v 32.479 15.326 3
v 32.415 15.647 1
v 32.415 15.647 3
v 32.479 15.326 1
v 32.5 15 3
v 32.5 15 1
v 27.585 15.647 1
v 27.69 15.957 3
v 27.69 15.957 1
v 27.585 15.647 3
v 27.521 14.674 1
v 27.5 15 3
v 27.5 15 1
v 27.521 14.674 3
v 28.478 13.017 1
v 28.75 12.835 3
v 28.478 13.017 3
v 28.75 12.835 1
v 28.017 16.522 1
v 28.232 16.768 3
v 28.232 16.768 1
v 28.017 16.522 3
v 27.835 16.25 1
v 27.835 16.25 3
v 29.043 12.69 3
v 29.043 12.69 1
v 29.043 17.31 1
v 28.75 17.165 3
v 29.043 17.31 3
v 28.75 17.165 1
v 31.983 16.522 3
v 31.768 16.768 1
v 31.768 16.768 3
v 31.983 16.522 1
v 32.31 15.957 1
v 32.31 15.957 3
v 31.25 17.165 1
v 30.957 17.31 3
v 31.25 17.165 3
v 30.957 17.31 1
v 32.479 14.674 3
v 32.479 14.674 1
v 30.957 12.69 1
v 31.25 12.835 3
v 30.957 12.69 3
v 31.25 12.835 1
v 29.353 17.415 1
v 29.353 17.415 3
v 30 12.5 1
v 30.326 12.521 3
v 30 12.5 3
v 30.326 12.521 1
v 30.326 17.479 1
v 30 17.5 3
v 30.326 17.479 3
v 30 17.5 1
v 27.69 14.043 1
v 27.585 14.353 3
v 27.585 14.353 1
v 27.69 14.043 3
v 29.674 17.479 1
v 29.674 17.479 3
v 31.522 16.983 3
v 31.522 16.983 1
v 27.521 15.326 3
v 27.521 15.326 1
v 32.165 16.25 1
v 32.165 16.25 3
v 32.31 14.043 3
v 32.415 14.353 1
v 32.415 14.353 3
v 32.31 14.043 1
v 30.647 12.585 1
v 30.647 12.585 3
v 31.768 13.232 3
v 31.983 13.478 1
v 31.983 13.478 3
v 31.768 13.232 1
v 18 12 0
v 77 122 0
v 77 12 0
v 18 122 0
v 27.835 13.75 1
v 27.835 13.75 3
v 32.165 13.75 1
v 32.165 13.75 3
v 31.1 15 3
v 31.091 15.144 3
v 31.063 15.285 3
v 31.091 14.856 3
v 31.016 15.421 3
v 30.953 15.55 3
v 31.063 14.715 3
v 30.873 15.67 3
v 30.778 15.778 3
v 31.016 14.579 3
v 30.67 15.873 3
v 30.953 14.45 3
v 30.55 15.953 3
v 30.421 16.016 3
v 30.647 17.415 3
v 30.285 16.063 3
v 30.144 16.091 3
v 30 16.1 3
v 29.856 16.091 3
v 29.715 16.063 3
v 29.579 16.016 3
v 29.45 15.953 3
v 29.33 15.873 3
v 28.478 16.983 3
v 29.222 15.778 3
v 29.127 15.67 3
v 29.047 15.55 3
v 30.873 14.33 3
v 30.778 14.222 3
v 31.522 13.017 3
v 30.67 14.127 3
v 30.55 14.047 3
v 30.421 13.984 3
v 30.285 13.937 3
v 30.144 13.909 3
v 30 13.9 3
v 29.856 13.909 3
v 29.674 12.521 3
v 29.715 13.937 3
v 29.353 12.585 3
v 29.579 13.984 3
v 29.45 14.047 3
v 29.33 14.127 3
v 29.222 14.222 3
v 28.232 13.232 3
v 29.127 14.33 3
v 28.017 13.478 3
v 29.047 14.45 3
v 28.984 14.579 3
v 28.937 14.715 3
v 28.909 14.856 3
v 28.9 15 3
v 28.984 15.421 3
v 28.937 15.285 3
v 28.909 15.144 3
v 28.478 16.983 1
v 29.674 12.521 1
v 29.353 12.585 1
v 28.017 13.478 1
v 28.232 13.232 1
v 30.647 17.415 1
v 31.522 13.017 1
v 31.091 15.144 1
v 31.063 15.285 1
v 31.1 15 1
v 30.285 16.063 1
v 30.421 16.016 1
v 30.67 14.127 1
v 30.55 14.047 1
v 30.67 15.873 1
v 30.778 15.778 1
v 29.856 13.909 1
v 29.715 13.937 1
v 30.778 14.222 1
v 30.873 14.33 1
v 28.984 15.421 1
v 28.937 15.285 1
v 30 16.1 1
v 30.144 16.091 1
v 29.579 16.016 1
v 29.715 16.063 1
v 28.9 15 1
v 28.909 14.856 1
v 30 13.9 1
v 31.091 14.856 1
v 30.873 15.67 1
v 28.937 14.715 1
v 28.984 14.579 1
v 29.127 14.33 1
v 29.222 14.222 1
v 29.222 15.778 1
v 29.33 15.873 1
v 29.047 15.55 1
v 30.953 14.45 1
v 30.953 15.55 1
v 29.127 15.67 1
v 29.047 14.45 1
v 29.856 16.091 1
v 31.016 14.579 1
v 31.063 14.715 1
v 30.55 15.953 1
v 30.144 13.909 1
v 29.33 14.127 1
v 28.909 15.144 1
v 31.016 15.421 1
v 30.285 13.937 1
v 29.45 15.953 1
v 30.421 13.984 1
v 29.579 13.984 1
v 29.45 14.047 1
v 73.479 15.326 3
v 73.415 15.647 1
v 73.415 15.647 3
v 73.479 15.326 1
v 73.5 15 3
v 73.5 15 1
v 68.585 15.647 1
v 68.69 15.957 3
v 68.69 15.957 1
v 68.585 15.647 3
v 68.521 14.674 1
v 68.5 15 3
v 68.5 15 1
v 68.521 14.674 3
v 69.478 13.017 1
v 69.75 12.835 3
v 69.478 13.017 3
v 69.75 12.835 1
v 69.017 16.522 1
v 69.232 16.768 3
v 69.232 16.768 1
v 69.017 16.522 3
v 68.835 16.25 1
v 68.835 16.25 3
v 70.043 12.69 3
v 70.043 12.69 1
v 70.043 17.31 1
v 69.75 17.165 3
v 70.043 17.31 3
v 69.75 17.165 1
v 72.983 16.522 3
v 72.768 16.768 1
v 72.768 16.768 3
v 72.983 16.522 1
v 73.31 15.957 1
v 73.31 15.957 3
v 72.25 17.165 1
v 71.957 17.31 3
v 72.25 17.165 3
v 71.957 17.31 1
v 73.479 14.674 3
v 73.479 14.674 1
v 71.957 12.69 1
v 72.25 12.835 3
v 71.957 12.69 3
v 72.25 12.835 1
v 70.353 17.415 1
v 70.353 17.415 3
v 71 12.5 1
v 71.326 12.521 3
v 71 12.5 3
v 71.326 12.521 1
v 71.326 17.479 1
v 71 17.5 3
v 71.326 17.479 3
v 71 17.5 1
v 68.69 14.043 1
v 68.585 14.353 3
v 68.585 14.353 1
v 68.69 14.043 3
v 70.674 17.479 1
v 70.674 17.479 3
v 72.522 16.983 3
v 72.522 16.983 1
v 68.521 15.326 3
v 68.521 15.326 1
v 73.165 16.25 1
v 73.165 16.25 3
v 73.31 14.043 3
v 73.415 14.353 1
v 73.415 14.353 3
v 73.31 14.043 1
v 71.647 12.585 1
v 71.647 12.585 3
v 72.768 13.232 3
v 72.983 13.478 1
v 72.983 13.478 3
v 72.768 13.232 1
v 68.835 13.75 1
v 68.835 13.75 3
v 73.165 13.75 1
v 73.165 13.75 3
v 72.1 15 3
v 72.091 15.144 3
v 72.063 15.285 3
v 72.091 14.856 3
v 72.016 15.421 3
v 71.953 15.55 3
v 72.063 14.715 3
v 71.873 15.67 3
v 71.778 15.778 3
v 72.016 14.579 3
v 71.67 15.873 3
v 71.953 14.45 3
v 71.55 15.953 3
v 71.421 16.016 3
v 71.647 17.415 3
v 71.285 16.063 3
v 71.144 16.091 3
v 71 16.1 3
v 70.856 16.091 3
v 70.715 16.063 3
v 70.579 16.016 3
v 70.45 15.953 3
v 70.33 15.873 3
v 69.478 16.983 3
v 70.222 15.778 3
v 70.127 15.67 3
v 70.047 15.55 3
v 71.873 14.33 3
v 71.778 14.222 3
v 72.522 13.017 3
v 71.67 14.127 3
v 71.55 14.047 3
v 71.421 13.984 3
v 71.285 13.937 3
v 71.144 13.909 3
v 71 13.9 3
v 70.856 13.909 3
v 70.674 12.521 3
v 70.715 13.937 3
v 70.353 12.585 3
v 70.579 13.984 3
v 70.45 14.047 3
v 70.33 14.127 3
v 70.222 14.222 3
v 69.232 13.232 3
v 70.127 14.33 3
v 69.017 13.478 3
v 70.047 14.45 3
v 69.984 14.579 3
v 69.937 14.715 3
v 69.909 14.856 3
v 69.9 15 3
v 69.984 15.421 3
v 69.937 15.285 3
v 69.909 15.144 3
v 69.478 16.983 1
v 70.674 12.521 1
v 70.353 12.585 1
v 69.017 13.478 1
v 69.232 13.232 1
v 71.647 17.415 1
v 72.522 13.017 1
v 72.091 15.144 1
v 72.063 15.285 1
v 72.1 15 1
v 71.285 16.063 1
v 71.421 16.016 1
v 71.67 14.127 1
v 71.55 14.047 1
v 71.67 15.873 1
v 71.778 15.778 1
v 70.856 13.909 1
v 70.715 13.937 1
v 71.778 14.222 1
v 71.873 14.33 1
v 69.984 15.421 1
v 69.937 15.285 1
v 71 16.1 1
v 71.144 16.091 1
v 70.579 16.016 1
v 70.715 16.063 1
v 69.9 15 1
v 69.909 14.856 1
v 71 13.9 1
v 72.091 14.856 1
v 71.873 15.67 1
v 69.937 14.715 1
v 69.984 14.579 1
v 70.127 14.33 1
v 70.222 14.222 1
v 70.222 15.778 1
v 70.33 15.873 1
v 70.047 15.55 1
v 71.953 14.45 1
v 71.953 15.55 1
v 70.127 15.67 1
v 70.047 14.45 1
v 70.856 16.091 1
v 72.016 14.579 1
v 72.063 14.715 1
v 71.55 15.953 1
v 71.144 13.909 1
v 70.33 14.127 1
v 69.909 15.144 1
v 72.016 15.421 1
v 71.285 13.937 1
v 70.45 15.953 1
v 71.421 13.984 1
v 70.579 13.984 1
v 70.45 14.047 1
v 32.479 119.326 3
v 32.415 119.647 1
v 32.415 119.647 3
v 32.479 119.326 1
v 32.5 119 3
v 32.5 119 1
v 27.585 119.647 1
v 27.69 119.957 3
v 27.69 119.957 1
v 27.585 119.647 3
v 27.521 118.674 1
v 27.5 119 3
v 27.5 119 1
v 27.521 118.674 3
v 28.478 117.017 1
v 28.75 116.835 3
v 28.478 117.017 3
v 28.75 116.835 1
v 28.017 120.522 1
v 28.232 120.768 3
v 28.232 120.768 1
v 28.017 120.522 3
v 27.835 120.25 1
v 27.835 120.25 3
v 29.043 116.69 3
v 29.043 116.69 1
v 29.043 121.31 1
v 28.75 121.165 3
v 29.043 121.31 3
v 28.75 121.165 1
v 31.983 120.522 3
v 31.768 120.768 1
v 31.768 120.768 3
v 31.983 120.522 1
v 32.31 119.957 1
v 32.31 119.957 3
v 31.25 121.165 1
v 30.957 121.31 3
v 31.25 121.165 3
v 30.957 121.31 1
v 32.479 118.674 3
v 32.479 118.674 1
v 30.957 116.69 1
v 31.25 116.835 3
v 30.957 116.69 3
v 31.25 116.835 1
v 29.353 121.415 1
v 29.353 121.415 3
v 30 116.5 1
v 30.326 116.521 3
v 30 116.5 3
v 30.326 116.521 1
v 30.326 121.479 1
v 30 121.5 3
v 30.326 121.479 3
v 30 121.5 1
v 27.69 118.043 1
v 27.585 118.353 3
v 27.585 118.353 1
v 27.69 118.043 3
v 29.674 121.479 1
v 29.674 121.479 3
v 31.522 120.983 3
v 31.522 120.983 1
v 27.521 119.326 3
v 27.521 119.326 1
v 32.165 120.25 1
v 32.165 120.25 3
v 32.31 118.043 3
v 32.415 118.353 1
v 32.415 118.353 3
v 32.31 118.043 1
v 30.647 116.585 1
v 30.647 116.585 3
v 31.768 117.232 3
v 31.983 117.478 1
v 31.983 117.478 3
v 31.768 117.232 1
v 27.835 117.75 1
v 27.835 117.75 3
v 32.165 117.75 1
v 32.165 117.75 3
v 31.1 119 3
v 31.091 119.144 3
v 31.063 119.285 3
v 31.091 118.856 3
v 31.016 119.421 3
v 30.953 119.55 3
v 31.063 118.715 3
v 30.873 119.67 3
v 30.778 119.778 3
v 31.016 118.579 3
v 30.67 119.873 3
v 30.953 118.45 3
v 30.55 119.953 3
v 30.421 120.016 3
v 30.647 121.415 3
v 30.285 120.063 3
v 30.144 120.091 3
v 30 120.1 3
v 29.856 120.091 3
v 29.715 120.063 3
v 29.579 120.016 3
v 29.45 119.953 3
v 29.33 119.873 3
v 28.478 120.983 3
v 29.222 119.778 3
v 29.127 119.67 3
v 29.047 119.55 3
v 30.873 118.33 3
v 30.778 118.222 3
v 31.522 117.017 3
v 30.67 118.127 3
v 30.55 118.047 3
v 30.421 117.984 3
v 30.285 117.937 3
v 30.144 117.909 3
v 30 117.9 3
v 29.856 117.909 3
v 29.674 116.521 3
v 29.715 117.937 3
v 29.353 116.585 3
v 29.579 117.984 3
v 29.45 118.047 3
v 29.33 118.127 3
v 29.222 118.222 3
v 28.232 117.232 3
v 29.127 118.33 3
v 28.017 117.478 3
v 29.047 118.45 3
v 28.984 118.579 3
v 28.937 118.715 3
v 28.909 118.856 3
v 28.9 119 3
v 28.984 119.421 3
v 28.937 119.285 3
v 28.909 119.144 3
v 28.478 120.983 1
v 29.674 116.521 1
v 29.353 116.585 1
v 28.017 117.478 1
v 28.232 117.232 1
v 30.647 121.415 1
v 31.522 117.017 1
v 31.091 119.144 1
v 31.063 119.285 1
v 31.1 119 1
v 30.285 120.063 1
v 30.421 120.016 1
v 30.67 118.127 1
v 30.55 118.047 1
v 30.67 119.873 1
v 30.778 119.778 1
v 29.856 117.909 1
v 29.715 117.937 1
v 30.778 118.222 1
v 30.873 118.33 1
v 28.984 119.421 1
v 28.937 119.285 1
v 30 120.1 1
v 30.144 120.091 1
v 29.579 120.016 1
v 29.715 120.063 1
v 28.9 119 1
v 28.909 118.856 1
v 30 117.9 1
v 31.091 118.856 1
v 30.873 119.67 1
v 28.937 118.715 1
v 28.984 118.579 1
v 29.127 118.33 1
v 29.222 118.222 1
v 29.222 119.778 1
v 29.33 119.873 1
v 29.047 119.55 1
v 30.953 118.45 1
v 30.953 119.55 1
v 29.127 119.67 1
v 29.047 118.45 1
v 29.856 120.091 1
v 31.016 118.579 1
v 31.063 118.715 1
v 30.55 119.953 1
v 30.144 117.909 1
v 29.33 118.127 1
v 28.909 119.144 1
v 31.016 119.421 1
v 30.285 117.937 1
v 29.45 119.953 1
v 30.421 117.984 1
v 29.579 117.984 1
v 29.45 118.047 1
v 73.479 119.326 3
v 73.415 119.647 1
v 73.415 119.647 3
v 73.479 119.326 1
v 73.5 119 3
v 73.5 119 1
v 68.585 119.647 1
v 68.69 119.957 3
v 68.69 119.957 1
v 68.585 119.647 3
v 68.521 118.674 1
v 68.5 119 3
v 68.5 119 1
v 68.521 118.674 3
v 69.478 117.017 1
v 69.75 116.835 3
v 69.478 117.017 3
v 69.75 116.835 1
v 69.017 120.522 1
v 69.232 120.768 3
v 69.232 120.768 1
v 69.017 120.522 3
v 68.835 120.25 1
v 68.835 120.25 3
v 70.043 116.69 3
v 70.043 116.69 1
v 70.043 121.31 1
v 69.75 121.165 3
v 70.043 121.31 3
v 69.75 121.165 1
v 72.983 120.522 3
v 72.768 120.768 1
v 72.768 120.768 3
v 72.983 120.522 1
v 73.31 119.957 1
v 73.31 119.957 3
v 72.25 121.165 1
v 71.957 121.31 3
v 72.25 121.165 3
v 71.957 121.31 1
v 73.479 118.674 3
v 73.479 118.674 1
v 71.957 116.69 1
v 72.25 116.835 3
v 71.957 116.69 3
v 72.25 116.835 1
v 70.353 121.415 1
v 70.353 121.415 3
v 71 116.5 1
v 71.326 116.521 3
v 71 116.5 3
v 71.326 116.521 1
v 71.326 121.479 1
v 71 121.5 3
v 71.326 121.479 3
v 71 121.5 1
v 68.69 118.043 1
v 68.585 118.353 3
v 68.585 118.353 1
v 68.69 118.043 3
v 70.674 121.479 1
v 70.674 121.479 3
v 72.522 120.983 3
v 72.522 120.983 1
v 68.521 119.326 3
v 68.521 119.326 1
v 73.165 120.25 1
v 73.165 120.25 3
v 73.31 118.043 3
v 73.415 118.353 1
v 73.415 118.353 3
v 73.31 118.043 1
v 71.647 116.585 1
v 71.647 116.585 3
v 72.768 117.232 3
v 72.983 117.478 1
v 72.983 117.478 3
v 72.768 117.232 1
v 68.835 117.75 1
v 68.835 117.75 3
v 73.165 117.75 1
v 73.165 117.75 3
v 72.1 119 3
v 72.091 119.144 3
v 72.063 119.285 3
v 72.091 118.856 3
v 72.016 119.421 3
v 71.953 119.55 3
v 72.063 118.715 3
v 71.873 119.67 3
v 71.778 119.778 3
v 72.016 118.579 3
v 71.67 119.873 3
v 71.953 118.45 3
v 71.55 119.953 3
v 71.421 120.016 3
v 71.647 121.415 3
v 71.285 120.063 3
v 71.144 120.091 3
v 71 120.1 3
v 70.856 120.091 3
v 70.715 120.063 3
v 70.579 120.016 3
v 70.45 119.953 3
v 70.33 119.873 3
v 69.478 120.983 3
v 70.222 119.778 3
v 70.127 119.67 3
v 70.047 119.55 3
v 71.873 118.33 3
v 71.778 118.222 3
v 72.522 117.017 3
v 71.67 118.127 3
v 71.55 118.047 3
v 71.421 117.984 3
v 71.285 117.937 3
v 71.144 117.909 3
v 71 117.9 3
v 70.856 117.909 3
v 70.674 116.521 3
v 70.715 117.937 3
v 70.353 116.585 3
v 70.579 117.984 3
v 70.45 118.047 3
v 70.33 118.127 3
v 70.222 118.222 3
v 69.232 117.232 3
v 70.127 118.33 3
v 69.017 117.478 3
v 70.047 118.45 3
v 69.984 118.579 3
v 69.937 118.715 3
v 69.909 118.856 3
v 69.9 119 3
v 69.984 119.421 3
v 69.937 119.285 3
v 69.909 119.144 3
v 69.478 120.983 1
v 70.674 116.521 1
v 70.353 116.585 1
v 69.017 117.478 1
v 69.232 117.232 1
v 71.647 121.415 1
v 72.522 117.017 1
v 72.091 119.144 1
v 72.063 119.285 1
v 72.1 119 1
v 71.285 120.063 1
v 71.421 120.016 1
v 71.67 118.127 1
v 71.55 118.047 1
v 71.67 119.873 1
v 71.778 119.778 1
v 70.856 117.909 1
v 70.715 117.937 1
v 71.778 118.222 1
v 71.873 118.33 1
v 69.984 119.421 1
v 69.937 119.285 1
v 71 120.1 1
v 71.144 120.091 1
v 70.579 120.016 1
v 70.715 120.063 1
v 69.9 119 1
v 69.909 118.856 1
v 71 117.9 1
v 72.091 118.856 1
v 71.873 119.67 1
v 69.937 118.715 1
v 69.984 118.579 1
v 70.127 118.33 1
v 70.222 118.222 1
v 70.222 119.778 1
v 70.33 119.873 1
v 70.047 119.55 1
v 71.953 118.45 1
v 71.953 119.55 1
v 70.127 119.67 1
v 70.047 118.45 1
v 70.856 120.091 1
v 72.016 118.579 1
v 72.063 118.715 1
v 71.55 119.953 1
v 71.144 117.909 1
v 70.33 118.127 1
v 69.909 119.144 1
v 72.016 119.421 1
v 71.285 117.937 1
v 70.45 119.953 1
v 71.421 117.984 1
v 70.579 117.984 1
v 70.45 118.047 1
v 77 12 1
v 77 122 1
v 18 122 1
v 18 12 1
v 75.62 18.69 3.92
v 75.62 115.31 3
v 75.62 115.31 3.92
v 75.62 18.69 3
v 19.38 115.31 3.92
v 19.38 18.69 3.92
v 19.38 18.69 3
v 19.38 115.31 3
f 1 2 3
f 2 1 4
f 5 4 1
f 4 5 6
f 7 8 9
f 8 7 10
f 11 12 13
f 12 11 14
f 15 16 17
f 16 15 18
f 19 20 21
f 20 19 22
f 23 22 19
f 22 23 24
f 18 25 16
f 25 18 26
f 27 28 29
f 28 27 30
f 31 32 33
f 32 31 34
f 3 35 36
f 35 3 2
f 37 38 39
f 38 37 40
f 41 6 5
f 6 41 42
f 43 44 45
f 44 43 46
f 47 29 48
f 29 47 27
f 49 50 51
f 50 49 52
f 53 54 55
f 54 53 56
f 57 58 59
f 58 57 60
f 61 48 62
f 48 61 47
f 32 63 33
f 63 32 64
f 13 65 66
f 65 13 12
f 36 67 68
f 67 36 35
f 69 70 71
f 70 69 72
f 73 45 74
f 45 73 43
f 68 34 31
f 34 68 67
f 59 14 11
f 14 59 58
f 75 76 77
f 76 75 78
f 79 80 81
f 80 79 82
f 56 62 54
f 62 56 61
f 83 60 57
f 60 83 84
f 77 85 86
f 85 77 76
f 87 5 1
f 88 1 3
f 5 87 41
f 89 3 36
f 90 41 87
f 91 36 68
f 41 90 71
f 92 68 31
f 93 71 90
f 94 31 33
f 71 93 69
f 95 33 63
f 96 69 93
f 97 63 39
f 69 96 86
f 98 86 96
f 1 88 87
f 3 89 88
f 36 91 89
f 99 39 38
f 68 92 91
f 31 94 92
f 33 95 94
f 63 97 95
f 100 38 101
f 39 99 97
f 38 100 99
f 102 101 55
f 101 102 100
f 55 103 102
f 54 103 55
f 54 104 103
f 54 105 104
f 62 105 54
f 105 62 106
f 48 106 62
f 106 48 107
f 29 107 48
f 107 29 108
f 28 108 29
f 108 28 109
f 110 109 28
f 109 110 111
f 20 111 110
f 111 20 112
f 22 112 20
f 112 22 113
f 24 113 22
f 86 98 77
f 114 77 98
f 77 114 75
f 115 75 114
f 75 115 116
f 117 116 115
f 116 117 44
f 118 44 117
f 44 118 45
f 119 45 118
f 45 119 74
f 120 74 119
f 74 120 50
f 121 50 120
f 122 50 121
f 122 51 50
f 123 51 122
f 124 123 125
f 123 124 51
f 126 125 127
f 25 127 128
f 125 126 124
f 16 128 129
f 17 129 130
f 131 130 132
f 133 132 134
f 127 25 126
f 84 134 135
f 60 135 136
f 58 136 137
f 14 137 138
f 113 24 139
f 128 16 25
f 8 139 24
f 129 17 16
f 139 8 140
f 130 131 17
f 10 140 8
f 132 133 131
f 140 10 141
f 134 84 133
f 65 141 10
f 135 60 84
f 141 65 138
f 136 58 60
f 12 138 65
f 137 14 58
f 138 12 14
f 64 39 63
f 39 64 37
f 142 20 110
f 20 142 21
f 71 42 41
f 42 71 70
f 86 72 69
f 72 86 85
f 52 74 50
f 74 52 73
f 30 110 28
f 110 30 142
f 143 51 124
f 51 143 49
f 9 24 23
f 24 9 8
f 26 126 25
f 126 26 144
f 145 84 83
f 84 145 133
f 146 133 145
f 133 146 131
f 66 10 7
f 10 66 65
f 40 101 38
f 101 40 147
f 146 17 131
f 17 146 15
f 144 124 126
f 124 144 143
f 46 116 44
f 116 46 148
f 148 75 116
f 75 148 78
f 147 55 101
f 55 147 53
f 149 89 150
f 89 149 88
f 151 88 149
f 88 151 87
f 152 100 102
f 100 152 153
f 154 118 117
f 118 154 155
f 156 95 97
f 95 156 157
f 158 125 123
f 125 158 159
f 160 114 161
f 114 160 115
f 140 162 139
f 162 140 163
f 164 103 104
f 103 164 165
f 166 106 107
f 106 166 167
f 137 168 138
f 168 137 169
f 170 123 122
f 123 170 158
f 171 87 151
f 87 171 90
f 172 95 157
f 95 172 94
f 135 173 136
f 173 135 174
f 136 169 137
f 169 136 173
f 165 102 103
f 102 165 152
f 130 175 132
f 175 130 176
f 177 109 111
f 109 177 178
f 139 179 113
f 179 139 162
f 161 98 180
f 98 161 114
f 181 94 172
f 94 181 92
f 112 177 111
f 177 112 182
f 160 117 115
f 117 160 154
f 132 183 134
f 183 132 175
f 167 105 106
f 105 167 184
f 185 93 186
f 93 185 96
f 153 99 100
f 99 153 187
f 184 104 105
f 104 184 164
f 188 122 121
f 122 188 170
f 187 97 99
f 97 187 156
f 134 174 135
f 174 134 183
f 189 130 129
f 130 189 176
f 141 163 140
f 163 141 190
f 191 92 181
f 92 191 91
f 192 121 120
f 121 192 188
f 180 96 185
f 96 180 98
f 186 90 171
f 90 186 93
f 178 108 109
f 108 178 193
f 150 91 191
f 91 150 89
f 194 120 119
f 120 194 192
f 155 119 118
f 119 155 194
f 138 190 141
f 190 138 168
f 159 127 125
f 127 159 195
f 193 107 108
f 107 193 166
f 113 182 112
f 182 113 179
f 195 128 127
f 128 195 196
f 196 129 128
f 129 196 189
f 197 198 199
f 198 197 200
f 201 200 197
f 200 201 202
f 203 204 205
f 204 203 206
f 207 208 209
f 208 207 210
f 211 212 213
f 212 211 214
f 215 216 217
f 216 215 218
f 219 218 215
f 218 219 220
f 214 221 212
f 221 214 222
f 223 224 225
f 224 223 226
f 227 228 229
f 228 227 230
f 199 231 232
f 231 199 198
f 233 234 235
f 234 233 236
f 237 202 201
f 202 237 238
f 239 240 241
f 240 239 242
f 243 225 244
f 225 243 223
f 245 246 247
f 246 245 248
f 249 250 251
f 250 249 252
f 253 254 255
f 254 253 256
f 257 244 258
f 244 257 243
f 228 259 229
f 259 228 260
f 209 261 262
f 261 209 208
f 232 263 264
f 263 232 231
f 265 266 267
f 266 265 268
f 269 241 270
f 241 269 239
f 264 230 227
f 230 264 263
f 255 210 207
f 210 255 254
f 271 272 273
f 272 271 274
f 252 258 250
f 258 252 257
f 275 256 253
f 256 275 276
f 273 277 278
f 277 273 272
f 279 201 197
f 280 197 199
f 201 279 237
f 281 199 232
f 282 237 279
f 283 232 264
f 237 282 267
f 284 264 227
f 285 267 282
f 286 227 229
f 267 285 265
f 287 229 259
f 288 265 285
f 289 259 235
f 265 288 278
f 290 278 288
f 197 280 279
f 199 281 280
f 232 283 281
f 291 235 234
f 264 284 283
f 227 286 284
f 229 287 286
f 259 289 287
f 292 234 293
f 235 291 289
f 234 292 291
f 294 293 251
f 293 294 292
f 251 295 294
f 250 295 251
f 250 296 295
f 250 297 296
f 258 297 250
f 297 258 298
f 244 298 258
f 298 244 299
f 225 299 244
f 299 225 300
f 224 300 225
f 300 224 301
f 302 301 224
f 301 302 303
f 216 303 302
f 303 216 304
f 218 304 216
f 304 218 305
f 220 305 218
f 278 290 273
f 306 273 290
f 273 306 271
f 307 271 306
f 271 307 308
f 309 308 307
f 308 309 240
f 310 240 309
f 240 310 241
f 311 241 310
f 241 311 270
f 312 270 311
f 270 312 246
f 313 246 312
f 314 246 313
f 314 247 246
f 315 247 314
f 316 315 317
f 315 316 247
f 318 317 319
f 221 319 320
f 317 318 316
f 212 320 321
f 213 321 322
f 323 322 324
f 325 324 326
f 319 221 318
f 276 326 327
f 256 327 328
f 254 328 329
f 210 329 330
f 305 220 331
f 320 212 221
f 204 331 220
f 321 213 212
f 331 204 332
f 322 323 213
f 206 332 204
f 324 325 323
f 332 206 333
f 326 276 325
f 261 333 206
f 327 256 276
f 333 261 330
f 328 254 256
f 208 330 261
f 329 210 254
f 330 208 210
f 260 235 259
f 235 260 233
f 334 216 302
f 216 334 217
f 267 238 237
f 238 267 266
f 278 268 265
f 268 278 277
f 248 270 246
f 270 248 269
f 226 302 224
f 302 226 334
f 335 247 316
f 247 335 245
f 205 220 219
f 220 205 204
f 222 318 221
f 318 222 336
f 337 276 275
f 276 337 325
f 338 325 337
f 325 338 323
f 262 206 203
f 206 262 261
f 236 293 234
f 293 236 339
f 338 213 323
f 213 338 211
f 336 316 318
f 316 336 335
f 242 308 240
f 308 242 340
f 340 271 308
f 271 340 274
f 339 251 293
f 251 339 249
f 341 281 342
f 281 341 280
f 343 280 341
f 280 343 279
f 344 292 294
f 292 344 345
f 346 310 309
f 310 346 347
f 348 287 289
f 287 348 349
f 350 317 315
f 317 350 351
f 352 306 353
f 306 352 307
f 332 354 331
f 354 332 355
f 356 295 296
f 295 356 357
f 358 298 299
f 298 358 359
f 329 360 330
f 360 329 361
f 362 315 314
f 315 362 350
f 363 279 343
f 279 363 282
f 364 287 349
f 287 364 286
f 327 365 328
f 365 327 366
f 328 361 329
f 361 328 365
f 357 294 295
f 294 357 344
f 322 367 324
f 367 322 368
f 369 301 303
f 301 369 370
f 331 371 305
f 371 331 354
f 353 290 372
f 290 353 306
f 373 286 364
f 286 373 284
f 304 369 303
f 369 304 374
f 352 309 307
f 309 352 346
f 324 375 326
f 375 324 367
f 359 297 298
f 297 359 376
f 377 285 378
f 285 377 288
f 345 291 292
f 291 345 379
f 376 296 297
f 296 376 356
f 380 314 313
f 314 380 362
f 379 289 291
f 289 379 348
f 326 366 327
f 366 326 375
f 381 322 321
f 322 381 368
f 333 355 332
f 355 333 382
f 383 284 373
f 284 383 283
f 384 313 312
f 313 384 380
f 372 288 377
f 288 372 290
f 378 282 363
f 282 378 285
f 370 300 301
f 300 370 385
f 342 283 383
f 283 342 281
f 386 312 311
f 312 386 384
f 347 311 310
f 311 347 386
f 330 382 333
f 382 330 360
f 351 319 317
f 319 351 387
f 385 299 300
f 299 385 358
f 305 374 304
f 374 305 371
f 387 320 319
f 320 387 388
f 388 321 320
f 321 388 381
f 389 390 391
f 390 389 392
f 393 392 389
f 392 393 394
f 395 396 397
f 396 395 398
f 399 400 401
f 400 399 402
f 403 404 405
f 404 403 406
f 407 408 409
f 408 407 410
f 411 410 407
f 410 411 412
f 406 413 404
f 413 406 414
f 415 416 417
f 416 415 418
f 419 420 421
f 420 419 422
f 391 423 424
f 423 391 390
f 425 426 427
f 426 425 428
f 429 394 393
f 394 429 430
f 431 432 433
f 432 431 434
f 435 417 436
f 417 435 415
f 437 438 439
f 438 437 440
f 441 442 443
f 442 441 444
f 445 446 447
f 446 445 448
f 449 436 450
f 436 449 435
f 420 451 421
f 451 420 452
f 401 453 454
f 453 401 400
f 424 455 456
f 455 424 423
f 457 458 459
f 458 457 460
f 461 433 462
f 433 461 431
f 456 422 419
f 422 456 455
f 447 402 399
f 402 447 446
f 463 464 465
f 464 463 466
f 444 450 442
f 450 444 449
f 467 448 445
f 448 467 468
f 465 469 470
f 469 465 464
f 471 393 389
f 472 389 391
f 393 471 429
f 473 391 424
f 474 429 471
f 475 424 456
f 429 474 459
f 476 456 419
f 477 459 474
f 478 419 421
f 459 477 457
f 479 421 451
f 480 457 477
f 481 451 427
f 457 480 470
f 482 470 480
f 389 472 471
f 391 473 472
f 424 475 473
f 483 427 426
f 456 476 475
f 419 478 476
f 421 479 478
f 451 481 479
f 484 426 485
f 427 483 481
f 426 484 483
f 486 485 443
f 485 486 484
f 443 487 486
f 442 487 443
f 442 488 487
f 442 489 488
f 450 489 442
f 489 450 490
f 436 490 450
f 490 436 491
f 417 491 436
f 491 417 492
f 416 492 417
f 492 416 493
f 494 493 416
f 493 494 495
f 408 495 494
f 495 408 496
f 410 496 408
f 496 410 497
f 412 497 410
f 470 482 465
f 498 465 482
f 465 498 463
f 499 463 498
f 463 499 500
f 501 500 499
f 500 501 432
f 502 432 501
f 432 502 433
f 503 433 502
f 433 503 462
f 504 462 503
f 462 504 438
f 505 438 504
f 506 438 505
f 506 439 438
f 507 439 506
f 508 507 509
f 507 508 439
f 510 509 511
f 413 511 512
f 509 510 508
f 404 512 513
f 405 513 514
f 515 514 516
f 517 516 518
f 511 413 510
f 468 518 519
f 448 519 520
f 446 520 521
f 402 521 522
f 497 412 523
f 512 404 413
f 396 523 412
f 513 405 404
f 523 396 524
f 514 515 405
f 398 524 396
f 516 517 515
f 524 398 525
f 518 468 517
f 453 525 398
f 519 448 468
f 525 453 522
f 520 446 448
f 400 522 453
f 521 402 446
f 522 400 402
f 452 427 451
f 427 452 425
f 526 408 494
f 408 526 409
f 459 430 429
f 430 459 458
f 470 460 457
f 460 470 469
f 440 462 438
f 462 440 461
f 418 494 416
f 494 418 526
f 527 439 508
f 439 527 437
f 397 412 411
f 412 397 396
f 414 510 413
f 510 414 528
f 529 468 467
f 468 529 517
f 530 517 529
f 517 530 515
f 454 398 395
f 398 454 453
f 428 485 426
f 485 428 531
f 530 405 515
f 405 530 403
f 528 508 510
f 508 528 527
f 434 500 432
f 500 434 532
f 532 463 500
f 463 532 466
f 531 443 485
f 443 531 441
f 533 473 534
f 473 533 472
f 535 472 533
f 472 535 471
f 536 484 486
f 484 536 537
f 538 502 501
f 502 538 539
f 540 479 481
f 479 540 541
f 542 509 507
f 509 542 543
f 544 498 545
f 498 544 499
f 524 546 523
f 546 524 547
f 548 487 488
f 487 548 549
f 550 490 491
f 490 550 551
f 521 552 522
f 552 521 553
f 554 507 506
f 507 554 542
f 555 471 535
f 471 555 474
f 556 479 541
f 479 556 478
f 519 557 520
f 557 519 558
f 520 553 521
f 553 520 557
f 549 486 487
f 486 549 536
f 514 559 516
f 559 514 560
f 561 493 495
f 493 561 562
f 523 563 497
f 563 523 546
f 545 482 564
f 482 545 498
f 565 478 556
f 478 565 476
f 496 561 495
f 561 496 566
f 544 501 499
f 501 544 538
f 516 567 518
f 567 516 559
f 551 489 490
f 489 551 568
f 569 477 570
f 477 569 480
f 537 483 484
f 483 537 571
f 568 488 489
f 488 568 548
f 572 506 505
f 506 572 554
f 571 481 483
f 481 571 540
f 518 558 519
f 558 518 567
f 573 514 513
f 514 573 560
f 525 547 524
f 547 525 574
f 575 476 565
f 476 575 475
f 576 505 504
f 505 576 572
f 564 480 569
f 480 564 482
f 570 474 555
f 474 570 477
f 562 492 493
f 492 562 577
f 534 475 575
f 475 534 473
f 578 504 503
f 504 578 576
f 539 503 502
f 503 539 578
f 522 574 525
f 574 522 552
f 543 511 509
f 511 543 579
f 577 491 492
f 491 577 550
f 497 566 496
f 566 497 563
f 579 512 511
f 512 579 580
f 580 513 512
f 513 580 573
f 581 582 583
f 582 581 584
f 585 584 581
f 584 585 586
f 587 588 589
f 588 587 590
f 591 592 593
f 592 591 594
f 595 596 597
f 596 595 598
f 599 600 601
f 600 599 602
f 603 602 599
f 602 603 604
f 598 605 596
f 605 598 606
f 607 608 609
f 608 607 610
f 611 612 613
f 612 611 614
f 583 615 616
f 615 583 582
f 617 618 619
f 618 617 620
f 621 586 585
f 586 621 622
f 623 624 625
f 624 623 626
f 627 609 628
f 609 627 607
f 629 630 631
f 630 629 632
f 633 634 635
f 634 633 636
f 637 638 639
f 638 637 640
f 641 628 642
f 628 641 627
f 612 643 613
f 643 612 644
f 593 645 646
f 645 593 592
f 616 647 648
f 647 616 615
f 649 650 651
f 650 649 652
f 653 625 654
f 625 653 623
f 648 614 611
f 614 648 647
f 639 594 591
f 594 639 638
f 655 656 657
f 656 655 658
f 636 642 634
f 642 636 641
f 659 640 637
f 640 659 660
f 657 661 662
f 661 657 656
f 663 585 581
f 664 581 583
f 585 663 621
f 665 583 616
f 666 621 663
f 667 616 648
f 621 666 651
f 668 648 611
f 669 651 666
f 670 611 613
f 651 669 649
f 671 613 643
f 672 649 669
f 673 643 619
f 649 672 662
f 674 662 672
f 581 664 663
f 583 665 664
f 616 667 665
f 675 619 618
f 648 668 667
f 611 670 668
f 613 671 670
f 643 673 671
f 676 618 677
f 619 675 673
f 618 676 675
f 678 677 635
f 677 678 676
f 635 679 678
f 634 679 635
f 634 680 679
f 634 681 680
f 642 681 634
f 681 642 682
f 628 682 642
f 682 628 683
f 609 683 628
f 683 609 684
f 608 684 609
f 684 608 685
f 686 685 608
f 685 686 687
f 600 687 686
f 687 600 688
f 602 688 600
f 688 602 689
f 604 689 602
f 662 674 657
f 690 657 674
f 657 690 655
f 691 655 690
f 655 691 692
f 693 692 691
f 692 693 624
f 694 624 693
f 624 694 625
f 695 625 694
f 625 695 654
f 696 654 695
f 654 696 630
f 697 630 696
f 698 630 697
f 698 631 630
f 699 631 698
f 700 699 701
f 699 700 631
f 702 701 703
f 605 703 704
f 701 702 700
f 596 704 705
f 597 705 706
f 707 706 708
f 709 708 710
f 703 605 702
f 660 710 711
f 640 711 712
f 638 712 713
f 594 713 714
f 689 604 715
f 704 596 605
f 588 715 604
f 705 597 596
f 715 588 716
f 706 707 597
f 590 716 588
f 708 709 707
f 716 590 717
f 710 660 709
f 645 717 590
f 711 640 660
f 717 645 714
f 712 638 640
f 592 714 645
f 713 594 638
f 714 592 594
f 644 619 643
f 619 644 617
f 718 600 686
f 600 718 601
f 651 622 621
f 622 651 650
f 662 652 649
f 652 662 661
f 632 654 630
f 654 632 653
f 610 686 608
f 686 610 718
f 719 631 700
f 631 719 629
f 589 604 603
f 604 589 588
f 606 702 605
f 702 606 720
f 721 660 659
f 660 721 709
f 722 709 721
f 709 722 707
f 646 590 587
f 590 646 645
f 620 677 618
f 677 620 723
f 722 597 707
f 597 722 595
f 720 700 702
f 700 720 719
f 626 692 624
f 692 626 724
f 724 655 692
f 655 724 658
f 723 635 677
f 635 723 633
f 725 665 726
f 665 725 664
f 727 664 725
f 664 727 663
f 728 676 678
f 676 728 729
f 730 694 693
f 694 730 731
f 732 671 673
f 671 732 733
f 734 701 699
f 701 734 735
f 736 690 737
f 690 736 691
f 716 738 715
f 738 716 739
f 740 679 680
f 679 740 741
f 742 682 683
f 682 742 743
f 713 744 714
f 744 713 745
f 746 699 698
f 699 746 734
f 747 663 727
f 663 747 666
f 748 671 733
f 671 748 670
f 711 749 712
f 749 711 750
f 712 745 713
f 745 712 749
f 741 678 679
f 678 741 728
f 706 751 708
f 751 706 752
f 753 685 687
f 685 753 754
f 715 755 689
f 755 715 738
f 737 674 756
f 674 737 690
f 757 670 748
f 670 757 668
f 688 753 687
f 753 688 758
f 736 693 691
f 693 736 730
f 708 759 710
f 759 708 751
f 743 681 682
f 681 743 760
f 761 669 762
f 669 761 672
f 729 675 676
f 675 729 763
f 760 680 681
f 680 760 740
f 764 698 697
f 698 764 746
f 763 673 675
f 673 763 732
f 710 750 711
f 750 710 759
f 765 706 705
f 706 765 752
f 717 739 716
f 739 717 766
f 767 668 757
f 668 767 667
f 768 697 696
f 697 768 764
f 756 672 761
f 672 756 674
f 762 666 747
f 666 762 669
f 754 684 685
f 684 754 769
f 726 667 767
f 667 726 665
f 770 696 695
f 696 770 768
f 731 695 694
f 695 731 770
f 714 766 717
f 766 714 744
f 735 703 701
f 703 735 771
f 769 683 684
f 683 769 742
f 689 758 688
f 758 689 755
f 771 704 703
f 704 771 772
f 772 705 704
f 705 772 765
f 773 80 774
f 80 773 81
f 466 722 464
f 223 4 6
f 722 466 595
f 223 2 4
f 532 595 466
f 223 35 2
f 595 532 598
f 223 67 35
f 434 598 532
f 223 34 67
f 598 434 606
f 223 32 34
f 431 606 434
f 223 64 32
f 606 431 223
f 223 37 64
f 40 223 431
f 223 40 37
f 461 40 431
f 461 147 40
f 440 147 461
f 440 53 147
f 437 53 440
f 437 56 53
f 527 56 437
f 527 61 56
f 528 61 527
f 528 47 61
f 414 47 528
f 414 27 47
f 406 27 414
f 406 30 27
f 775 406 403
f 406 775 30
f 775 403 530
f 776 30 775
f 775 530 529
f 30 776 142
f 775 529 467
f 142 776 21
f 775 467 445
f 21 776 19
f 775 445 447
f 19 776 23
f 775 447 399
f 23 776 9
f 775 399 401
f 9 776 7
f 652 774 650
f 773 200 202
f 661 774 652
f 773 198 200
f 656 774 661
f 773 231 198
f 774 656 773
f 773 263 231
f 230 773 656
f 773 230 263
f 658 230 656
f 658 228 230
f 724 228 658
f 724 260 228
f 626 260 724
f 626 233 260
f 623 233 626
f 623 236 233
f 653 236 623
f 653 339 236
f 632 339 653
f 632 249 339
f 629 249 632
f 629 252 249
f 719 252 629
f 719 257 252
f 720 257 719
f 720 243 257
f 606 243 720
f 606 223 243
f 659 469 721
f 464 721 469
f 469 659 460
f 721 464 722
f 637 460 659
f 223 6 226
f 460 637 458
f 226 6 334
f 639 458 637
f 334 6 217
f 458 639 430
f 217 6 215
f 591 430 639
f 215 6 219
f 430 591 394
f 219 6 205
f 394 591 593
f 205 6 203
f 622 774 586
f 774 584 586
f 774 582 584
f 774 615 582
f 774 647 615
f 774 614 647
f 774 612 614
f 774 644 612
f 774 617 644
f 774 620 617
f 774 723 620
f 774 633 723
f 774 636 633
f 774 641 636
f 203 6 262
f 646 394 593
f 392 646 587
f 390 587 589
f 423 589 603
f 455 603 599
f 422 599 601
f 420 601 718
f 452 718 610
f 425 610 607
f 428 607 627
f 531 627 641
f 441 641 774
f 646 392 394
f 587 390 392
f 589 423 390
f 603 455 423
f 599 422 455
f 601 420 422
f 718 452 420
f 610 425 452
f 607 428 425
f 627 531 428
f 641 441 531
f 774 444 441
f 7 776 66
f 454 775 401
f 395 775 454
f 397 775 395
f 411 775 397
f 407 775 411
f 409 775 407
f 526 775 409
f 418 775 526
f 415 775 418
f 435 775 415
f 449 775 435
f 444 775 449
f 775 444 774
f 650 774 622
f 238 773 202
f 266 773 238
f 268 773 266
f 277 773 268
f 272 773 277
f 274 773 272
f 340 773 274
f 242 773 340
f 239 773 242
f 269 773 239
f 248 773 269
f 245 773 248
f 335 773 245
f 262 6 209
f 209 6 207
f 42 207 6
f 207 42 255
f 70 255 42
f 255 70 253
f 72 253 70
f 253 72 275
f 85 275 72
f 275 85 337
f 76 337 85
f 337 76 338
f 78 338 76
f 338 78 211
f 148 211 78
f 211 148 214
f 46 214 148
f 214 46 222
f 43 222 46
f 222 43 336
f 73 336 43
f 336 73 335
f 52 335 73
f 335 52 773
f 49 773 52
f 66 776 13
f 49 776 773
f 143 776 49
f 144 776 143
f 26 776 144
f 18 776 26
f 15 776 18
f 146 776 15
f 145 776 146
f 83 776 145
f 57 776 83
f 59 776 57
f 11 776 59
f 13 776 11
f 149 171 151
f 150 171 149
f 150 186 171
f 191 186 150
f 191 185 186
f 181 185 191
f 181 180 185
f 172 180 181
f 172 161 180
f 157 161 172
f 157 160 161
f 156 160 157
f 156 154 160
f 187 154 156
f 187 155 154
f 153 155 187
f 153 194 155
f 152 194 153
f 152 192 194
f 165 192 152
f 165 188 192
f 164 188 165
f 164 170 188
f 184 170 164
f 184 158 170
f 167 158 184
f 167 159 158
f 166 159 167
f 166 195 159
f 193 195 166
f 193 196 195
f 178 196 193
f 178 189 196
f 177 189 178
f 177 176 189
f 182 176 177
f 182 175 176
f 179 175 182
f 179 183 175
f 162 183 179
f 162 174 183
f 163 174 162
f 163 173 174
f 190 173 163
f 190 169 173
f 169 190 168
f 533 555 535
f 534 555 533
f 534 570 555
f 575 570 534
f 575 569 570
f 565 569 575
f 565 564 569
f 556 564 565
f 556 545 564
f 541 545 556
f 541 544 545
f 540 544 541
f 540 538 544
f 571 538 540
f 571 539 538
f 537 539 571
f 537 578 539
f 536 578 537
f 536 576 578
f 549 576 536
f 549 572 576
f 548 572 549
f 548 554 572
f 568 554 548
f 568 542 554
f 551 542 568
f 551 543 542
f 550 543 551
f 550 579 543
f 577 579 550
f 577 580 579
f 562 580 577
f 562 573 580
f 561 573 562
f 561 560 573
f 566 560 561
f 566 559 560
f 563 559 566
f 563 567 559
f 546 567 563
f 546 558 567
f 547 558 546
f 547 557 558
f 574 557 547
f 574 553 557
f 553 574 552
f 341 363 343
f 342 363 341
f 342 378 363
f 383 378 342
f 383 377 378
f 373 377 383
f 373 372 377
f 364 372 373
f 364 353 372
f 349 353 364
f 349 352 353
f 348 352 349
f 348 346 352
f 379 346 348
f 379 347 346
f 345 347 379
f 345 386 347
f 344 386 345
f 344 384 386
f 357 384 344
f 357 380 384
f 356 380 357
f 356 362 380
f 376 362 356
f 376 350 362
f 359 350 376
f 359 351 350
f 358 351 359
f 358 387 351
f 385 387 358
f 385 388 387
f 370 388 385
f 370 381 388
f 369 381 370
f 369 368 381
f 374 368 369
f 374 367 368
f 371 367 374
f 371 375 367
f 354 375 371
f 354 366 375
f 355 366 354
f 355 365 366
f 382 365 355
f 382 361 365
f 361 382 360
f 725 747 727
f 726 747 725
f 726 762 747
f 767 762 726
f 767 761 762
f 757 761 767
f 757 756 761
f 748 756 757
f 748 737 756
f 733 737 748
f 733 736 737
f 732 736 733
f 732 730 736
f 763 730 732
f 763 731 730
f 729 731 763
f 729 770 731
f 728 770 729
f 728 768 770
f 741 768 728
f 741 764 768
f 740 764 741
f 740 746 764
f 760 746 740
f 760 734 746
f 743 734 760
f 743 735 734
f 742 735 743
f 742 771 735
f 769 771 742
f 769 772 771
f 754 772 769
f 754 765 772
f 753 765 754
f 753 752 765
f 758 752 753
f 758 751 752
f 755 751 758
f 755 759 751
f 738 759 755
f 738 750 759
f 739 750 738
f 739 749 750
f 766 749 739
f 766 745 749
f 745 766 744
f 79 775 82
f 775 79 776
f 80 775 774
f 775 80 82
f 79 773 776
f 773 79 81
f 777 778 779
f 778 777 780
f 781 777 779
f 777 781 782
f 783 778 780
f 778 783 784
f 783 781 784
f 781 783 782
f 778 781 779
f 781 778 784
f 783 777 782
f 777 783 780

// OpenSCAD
// ENKU Reader R0.1 — preliminary fastener envelope, NOT a validated assembly
// Coordinates use KiCad XY in mm. Z exaggerated for readability.
$fn=48;
pcb_x0=18; pcb_x1=77;
pcb_y0=12; pcb_y1=122; // CANDIDATE 59 x 110 mm, NOT applied to PCB
display_w=56.24; display_h=96.62;
cx=47.5; cy=67;
disp_x0=cx-display_w/2; disp_y0=cy-display_h/2;
boss_d=5.0; drill_d=2.2;
holes=[[30,15],[71,15],[30,119],[71,119]]; // candidate, NOT KiCad positions
module slab(x,y,z,w,h,t,c) {color(c) translate([x,y,z]) cube([w,h,t]);}
slab(pcb_x0,pcb_y0,0,pcb_x1-pcb_x0,pcb_y1-pcb_y0,1,[0.1,0.43,0.35,0.75]);
slab(disp_x0,disp_y0,3,display_w,display_h,0.92,[0.82,0.83,0.78,0.8]);
for(p=holes) {
  color([0.8,0.56,0.2,0.9])
  translate([p[0],p[1],0]) difference() {
    cylinder(d=boss_d,h=3);
    translate([0,0,-0.1]) cylinder(d=drill_d,h=3.2);
  }
}
echo("DISPLAY_Y",disp_y0,disp_y0+display_h);
echo("TOP_BOSS_TO_DISPLAY_GAP",disp_y0-(15+boss_d/2));
echo("BOTTOM_BOSS_TO_DISPLAY_GAP",(119-boss_d/2)-(disp_y0+display_h));
